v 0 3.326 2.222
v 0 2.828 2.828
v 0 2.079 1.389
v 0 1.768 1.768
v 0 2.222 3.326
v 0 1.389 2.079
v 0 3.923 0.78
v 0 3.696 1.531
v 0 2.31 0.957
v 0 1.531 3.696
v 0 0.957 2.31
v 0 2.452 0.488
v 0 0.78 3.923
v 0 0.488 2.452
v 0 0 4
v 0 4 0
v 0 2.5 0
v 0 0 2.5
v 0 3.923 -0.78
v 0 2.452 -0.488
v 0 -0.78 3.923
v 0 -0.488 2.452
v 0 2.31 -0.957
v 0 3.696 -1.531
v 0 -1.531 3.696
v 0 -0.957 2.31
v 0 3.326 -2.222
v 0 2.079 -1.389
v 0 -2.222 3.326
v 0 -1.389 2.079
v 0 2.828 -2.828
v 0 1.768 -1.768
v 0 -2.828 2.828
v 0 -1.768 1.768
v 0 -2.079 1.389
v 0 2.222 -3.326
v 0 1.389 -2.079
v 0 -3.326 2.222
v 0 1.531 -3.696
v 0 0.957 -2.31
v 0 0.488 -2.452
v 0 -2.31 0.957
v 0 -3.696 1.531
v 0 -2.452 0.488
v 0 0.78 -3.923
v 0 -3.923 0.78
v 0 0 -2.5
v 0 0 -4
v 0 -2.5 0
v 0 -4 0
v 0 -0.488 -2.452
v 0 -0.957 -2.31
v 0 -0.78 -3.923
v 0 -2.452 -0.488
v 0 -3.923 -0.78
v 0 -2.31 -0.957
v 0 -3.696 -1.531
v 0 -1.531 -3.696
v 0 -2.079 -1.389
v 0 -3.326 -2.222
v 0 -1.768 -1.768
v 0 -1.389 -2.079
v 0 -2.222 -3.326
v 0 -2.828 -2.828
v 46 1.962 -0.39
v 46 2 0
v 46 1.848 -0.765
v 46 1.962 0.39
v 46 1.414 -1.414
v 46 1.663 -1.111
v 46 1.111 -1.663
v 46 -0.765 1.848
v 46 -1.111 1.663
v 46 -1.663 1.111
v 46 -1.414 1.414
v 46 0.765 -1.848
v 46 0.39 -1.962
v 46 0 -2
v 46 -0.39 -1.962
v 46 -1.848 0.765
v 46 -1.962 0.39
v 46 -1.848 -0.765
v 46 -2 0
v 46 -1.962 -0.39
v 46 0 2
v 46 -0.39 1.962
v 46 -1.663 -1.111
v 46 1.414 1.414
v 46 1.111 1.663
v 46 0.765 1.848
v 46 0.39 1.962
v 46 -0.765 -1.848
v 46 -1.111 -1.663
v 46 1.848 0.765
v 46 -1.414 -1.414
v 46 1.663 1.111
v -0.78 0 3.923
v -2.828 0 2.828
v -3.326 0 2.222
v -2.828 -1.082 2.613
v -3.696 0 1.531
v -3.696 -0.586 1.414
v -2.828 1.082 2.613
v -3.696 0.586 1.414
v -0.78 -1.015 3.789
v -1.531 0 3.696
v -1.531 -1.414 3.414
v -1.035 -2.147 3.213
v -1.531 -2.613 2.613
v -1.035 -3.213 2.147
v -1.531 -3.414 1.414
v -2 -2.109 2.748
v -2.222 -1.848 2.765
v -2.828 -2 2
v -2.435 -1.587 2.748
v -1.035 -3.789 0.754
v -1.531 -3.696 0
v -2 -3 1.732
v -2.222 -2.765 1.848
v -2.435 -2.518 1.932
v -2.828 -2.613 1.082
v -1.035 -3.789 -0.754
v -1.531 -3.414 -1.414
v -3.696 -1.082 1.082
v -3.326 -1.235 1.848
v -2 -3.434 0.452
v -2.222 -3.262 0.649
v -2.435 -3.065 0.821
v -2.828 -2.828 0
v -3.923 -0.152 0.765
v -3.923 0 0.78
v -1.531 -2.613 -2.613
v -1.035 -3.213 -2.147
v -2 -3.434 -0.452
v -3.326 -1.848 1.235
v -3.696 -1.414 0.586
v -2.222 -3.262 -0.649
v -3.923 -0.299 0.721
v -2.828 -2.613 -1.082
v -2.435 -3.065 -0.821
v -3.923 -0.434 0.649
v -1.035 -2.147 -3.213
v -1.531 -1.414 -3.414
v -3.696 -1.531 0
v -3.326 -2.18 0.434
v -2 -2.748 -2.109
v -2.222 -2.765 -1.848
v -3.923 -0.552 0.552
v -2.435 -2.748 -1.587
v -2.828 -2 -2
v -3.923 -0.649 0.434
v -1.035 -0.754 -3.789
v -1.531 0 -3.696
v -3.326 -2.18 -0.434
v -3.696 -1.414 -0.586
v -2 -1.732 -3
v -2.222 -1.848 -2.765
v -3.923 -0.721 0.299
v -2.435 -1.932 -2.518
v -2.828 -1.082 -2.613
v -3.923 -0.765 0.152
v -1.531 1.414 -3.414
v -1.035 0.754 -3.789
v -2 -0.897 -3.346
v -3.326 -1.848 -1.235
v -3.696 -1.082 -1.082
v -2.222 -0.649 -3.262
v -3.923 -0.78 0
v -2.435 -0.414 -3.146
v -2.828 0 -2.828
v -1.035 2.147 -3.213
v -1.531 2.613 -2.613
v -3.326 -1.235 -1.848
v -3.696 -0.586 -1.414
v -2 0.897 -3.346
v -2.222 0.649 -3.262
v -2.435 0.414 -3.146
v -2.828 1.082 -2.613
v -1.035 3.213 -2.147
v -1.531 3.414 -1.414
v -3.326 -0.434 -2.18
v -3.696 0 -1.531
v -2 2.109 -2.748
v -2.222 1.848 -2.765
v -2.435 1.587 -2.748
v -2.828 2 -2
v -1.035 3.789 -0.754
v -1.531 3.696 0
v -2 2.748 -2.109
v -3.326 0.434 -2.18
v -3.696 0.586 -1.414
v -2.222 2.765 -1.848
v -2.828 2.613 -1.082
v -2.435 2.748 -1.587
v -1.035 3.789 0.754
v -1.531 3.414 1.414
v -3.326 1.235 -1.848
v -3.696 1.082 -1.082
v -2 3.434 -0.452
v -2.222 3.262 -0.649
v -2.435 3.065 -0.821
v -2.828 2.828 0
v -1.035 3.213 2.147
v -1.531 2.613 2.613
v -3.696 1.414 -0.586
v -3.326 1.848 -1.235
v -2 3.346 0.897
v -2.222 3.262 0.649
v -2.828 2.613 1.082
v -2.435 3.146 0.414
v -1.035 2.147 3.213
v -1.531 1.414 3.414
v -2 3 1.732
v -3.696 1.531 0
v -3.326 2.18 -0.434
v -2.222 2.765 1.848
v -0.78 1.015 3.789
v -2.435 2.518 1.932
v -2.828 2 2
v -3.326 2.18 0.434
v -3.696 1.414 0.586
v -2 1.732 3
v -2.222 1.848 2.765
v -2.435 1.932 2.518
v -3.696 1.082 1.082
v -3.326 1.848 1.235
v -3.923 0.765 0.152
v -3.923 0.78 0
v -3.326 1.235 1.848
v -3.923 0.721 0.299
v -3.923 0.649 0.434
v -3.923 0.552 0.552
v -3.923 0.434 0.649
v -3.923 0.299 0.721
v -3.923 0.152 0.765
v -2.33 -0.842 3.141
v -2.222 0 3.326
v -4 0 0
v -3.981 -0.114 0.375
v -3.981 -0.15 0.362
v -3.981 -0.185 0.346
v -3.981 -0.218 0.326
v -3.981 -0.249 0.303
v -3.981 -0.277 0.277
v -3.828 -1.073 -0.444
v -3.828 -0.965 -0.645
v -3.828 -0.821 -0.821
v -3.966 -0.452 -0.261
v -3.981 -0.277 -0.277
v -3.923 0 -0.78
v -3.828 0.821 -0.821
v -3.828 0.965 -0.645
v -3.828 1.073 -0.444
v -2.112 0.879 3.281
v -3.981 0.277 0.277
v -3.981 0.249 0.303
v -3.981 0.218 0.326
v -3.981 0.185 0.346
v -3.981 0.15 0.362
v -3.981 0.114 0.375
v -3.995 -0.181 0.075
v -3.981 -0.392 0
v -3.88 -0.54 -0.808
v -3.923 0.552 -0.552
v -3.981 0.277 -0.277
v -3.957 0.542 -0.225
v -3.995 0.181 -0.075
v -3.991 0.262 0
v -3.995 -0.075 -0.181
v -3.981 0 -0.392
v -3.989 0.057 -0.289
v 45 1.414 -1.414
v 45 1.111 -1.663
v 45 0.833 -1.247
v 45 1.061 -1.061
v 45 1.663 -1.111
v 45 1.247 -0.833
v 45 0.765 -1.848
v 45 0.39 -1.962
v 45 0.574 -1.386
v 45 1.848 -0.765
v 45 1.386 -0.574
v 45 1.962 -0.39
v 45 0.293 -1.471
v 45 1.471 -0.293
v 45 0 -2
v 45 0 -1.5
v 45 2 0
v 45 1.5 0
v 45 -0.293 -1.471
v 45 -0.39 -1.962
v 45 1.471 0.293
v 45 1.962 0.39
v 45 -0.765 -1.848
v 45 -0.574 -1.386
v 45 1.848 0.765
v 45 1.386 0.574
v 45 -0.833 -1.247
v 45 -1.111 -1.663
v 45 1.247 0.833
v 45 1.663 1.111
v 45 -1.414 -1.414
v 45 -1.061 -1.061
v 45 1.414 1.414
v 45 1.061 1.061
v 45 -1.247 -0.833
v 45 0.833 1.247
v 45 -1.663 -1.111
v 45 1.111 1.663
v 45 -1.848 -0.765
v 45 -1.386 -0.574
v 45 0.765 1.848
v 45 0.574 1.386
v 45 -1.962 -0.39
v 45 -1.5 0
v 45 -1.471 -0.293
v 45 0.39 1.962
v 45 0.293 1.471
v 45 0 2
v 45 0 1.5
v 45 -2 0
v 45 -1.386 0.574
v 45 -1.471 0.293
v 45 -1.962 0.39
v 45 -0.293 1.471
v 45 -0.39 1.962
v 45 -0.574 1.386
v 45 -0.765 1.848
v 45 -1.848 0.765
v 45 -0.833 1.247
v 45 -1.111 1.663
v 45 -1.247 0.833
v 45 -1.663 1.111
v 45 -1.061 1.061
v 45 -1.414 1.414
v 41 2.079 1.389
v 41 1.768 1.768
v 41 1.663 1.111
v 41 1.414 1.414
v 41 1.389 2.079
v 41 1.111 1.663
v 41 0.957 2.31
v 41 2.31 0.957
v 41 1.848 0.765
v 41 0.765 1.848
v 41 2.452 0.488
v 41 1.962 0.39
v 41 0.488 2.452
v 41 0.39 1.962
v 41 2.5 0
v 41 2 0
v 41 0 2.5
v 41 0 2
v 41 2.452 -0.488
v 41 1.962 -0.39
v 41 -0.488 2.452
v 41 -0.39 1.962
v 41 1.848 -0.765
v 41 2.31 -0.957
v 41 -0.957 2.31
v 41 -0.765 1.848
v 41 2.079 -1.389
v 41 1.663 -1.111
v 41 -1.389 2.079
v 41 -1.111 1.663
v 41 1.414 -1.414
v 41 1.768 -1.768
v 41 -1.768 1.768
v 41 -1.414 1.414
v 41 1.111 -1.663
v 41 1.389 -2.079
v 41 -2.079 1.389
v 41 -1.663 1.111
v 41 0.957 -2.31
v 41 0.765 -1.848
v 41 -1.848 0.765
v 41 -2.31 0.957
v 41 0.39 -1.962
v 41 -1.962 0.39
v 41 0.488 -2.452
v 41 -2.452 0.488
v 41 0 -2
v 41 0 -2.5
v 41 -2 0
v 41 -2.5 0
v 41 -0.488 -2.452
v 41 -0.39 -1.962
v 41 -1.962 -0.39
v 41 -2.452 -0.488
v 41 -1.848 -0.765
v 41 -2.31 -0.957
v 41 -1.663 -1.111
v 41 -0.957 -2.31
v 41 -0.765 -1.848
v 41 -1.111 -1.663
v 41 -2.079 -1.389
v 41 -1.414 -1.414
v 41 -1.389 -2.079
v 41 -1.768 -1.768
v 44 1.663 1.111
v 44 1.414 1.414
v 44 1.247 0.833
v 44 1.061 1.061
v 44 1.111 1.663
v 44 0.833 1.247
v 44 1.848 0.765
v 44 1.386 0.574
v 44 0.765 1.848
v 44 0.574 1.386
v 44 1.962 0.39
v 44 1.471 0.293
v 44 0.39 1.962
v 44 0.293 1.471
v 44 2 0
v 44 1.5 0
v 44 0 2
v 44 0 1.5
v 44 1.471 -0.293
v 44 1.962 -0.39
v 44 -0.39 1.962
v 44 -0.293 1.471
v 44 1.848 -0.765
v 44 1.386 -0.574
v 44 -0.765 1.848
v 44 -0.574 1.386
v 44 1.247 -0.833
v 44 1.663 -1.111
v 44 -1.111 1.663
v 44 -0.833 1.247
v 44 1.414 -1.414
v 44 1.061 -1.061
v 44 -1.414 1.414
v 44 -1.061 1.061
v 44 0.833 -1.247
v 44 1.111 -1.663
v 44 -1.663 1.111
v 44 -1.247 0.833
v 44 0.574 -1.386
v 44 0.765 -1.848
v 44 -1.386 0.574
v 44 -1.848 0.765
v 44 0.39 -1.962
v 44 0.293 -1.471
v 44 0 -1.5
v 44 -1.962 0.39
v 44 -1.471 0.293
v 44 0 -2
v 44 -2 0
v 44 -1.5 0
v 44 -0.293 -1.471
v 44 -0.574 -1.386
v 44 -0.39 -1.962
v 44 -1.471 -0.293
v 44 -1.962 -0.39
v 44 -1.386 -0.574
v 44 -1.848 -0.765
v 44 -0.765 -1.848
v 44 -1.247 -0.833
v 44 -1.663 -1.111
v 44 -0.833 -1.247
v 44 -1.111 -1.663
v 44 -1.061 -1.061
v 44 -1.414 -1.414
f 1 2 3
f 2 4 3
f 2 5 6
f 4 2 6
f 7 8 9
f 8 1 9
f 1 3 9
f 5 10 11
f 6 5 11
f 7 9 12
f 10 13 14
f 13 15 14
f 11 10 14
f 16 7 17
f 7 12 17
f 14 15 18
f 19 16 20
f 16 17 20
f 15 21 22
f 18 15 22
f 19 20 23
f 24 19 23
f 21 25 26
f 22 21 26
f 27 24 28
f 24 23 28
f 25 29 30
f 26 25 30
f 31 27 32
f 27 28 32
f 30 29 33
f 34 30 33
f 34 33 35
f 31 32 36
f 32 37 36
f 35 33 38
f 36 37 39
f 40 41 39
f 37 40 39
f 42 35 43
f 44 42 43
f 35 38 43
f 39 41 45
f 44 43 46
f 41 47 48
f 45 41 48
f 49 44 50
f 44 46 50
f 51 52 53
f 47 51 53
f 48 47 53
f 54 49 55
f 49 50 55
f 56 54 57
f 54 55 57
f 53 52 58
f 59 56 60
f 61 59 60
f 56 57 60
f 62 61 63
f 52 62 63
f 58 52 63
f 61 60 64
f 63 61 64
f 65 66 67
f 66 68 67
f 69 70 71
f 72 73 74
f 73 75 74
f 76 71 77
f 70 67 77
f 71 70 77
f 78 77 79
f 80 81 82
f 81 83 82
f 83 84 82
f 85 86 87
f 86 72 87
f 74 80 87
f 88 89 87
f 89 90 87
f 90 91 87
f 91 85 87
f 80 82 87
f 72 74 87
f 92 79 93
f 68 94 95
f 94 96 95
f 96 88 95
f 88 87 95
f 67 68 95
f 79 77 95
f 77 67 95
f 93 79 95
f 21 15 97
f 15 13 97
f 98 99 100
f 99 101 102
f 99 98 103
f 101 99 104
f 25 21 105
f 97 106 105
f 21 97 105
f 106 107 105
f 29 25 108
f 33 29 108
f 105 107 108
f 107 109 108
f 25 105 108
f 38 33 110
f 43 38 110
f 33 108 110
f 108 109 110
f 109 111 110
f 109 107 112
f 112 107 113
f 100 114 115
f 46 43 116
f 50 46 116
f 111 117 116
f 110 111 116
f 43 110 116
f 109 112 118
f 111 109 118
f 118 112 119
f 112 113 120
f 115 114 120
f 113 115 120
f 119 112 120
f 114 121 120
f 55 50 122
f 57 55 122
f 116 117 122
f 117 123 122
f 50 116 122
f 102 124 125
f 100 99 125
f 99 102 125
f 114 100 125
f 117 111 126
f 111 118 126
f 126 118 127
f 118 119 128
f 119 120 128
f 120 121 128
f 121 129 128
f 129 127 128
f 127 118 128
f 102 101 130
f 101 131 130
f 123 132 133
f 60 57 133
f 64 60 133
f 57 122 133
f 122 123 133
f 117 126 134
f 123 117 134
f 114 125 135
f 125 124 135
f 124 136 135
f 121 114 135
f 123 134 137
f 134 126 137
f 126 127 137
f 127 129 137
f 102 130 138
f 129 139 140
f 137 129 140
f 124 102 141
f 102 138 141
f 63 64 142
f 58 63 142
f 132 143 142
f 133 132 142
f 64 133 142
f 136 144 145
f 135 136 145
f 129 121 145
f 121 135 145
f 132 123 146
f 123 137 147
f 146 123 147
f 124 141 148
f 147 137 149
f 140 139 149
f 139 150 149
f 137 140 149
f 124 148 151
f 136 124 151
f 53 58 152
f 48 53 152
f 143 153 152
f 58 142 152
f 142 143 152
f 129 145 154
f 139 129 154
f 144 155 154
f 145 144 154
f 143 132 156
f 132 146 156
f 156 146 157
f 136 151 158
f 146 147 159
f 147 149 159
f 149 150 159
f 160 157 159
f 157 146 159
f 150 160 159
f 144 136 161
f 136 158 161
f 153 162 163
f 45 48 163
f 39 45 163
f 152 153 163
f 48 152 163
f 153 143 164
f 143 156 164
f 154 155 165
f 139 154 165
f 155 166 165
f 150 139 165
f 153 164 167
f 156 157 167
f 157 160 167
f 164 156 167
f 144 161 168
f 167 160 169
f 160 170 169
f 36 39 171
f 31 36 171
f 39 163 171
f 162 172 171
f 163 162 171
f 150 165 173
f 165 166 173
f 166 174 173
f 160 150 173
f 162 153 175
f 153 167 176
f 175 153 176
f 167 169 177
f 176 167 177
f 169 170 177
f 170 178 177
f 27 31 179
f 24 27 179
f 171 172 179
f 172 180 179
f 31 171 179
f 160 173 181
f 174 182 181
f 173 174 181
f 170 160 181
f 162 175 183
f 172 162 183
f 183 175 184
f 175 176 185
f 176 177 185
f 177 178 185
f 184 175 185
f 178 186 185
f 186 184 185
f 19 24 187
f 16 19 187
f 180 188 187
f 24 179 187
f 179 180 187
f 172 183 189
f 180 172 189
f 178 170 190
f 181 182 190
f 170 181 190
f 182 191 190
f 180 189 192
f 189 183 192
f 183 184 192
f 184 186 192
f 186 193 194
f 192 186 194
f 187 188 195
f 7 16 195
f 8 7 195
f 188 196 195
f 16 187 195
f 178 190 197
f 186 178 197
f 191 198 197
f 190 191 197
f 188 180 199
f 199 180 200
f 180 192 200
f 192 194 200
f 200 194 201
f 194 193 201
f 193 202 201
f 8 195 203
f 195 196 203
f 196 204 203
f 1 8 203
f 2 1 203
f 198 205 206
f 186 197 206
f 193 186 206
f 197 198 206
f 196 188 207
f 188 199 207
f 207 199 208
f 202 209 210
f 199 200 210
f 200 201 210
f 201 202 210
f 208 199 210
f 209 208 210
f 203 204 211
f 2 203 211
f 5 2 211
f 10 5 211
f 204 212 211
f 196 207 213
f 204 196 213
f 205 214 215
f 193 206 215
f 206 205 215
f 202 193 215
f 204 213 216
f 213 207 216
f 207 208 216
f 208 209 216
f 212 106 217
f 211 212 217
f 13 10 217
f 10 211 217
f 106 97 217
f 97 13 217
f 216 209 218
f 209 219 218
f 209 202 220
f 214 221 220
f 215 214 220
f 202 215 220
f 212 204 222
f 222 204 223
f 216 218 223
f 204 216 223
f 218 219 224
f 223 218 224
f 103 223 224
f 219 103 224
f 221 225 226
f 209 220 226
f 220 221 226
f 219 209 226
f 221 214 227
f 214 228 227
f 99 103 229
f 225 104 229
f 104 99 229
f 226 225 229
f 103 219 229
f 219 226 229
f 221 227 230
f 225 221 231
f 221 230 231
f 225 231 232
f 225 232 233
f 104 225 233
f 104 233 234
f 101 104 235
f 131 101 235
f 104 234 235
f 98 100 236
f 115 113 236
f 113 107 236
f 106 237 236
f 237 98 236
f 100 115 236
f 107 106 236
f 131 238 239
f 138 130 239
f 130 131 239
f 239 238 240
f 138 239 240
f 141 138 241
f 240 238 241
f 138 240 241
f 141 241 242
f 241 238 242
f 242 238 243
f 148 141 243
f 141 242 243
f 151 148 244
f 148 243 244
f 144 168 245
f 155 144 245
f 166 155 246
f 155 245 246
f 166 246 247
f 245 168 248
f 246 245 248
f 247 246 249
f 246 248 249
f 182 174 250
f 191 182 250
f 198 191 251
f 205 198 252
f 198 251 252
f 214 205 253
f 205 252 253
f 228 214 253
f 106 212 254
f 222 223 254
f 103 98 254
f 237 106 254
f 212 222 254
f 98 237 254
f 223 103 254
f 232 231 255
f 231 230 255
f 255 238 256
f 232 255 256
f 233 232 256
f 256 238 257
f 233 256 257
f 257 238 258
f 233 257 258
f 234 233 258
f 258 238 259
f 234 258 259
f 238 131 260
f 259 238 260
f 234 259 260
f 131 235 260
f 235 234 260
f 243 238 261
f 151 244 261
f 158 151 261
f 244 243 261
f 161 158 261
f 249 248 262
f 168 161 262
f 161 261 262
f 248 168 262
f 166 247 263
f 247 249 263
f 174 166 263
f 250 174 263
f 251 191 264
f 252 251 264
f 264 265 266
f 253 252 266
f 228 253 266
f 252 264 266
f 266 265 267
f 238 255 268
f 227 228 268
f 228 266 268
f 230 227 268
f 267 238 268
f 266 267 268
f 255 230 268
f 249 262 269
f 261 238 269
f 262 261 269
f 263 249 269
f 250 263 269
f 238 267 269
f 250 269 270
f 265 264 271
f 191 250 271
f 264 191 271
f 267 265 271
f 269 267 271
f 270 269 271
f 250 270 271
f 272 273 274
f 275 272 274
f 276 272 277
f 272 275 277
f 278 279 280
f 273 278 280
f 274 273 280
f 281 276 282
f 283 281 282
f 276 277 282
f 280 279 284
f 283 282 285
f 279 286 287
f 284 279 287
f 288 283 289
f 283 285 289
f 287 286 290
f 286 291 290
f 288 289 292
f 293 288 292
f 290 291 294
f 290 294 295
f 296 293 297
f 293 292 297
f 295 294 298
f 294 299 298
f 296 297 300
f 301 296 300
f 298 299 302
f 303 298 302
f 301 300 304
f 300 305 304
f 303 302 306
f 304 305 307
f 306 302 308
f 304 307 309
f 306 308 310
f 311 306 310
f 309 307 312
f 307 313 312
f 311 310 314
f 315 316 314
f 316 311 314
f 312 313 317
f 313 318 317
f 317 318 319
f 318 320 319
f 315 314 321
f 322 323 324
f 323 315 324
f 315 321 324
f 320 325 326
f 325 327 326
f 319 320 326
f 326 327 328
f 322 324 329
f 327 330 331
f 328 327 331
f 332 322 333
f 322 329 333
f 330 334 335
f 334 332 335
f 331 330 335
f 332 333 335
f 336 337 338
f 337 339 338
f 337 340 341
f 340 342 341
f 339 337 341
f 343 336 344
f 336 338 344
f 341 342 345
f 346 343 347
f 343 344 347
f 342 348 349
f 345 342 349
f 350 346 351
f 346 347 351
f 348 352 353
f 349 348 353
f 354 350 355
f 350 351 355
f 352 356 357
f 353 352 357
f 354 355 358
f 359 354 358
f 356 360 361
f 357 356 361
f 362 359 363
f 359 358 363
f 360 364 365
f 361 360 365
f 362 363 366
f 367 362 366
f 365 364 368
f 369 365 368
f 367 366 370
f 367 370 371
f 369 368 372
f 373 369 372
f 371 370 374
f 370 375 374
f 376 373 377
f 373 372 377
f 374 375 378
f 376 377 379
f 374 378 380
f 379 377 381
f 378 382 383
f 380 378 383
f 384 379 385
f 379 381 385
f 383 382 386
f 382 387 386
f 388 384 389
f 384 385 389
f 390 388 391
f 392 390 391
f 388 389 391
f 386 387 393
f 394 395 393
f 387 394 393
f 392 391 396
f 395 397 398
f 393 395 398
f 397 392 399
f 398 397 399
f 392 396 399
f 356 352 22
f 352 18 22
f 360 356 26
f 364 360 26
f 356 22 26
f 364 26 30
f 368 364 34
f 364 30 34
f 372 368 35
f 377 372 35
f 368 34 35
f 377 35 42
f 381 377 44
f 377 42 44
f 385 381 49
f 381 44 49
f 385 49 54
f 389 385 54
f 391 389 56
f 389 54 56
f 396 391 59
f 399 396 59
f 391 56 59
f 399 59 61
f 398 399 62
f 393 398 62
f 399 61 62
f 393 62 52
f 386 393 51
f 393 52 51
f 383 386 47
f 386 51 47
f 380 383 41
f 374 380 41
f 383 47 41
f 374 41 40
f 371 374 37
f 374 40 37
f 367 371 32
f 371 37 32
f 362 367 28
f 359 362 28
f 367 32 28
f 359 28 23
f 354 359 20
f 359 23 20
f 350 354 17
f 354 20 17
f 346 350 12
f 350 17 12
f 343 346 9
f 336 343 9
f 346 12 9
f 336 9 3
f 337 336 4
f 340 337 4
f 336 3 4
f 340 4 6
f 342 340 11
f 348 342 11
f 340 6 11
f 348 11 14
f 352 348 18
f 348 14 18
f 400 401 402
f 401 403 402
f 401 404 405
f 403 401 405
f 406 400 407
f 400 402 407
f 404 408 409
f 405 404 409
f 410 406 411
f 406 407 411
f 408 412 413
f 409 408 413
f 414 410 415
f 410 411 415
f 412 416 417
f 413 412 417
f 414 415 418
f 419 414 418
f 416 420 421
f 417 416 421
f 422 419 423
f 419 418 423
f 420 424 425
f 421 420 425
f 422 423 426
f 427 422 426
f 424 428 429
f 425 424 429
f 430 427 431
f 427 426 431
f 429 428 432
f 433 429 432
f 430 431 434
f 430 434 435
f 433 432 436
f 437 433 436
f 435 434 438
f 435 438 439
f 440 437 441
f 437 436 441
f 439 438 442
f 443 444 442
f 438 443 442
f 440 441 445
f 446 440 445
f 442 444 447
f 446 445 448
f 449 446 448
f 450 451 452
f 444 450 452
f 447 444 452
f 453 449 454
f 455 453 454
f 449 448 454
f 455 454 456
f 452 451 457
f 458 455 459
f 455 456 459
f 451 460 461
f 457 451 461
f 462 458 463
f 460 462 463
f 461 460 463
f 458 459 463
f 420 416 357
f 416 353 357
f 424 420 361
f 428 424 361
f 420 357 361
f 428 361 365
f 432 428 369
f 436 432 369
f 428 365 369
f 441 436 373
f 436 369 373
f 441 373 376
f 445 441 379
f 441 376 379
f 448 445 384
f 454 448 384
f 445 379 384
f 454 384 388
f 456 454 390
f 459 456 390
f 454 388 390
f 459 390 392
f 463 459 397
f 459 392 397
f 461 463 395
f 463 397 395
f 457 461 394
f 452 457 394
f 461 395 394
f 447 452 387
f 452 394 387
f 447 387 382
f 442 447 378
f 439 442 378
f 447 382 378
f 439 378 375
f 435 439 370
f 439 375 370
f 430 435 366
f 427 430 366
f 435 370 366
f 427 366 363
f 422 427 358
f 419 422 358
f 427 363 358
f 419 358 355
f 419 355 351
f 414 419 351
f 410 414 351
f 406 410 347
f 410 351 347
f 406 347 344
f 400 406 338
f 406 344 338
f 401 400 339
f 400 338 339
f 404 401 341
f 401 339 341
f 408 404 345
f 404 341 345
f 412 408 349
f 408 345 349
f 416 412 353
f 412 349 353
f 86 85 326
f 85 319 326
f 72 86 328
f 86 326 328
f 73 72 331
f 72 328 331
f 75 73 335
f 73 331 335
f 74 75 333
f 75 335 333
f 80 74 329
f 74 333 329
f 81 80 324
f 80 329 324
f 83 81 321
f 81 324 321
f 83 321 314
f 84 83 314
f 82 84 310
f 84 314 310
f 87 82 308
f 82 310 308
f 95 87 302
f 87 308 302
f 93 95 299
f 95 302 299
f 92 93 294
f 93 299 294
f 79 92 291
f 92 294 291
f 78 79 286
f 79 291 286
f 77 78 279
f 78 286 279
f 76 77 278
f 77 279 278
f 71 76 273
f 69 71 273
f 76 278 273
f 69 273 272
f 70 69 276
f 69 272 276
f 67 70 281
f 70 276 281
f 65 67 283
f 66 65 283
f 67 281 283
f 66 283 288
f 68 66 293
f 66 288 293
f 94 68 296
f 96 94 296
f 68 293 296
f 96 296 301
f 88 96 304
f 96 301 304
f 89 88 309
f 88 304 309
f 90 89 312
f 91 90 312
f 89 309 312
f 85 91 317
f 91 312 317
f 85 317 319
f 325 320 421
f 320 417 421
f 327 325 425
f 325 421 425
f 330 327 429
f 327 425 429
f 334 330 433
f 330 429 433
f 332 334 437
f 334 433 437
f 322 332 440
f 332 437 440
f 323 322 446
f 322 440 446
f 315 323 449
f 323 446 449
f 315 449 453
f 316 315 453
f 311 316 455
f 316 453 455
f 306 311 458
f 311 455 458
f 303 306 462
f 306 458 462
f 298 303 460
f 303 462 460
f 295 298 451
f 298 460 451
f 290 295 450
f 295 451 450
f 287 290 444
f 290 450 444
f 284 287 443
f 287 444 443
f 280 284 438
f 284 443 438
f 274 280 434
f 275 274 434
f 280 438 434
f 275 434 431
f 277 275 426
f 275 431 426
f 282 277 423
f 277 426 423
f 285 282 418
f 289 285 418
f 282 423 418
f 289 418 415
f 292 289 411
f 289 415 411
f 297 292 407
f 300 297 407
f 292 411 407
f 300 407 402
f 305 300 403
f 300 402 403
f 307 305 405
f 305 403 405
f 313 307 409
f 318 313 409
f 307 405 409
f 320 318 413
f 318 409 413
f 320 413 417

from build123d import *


with BuildPart() as f1:
    # F0 (on Front) → F1 (revolve)
    with BuildSketch(Plane.XZ):
        with BuildLine():
            Line((41, 2.5), (0, 2.5))
            Line((0, 2.5), (0, 4))
            ThreePointArc((0, 4), (-2.828427, 2.828427), (-4, 0))
            Line((-4, 0), (46, 0))
            Line((46, 0), (46, 2))
            Line((46, 2), (45, 2))
            Line((45, 2), (45, 1.5))
            Line((45, 1.5), (44, 1.5))
            Line((44, 1.5), (44, 2))
            Line((44, 2), (41, 2))
            Line((41, 2), (41, 2.5))
        make_face()
    revolve(axis=Axis((18.891413, 0, 0), (1, 0, 0)))


solid = f1.part
